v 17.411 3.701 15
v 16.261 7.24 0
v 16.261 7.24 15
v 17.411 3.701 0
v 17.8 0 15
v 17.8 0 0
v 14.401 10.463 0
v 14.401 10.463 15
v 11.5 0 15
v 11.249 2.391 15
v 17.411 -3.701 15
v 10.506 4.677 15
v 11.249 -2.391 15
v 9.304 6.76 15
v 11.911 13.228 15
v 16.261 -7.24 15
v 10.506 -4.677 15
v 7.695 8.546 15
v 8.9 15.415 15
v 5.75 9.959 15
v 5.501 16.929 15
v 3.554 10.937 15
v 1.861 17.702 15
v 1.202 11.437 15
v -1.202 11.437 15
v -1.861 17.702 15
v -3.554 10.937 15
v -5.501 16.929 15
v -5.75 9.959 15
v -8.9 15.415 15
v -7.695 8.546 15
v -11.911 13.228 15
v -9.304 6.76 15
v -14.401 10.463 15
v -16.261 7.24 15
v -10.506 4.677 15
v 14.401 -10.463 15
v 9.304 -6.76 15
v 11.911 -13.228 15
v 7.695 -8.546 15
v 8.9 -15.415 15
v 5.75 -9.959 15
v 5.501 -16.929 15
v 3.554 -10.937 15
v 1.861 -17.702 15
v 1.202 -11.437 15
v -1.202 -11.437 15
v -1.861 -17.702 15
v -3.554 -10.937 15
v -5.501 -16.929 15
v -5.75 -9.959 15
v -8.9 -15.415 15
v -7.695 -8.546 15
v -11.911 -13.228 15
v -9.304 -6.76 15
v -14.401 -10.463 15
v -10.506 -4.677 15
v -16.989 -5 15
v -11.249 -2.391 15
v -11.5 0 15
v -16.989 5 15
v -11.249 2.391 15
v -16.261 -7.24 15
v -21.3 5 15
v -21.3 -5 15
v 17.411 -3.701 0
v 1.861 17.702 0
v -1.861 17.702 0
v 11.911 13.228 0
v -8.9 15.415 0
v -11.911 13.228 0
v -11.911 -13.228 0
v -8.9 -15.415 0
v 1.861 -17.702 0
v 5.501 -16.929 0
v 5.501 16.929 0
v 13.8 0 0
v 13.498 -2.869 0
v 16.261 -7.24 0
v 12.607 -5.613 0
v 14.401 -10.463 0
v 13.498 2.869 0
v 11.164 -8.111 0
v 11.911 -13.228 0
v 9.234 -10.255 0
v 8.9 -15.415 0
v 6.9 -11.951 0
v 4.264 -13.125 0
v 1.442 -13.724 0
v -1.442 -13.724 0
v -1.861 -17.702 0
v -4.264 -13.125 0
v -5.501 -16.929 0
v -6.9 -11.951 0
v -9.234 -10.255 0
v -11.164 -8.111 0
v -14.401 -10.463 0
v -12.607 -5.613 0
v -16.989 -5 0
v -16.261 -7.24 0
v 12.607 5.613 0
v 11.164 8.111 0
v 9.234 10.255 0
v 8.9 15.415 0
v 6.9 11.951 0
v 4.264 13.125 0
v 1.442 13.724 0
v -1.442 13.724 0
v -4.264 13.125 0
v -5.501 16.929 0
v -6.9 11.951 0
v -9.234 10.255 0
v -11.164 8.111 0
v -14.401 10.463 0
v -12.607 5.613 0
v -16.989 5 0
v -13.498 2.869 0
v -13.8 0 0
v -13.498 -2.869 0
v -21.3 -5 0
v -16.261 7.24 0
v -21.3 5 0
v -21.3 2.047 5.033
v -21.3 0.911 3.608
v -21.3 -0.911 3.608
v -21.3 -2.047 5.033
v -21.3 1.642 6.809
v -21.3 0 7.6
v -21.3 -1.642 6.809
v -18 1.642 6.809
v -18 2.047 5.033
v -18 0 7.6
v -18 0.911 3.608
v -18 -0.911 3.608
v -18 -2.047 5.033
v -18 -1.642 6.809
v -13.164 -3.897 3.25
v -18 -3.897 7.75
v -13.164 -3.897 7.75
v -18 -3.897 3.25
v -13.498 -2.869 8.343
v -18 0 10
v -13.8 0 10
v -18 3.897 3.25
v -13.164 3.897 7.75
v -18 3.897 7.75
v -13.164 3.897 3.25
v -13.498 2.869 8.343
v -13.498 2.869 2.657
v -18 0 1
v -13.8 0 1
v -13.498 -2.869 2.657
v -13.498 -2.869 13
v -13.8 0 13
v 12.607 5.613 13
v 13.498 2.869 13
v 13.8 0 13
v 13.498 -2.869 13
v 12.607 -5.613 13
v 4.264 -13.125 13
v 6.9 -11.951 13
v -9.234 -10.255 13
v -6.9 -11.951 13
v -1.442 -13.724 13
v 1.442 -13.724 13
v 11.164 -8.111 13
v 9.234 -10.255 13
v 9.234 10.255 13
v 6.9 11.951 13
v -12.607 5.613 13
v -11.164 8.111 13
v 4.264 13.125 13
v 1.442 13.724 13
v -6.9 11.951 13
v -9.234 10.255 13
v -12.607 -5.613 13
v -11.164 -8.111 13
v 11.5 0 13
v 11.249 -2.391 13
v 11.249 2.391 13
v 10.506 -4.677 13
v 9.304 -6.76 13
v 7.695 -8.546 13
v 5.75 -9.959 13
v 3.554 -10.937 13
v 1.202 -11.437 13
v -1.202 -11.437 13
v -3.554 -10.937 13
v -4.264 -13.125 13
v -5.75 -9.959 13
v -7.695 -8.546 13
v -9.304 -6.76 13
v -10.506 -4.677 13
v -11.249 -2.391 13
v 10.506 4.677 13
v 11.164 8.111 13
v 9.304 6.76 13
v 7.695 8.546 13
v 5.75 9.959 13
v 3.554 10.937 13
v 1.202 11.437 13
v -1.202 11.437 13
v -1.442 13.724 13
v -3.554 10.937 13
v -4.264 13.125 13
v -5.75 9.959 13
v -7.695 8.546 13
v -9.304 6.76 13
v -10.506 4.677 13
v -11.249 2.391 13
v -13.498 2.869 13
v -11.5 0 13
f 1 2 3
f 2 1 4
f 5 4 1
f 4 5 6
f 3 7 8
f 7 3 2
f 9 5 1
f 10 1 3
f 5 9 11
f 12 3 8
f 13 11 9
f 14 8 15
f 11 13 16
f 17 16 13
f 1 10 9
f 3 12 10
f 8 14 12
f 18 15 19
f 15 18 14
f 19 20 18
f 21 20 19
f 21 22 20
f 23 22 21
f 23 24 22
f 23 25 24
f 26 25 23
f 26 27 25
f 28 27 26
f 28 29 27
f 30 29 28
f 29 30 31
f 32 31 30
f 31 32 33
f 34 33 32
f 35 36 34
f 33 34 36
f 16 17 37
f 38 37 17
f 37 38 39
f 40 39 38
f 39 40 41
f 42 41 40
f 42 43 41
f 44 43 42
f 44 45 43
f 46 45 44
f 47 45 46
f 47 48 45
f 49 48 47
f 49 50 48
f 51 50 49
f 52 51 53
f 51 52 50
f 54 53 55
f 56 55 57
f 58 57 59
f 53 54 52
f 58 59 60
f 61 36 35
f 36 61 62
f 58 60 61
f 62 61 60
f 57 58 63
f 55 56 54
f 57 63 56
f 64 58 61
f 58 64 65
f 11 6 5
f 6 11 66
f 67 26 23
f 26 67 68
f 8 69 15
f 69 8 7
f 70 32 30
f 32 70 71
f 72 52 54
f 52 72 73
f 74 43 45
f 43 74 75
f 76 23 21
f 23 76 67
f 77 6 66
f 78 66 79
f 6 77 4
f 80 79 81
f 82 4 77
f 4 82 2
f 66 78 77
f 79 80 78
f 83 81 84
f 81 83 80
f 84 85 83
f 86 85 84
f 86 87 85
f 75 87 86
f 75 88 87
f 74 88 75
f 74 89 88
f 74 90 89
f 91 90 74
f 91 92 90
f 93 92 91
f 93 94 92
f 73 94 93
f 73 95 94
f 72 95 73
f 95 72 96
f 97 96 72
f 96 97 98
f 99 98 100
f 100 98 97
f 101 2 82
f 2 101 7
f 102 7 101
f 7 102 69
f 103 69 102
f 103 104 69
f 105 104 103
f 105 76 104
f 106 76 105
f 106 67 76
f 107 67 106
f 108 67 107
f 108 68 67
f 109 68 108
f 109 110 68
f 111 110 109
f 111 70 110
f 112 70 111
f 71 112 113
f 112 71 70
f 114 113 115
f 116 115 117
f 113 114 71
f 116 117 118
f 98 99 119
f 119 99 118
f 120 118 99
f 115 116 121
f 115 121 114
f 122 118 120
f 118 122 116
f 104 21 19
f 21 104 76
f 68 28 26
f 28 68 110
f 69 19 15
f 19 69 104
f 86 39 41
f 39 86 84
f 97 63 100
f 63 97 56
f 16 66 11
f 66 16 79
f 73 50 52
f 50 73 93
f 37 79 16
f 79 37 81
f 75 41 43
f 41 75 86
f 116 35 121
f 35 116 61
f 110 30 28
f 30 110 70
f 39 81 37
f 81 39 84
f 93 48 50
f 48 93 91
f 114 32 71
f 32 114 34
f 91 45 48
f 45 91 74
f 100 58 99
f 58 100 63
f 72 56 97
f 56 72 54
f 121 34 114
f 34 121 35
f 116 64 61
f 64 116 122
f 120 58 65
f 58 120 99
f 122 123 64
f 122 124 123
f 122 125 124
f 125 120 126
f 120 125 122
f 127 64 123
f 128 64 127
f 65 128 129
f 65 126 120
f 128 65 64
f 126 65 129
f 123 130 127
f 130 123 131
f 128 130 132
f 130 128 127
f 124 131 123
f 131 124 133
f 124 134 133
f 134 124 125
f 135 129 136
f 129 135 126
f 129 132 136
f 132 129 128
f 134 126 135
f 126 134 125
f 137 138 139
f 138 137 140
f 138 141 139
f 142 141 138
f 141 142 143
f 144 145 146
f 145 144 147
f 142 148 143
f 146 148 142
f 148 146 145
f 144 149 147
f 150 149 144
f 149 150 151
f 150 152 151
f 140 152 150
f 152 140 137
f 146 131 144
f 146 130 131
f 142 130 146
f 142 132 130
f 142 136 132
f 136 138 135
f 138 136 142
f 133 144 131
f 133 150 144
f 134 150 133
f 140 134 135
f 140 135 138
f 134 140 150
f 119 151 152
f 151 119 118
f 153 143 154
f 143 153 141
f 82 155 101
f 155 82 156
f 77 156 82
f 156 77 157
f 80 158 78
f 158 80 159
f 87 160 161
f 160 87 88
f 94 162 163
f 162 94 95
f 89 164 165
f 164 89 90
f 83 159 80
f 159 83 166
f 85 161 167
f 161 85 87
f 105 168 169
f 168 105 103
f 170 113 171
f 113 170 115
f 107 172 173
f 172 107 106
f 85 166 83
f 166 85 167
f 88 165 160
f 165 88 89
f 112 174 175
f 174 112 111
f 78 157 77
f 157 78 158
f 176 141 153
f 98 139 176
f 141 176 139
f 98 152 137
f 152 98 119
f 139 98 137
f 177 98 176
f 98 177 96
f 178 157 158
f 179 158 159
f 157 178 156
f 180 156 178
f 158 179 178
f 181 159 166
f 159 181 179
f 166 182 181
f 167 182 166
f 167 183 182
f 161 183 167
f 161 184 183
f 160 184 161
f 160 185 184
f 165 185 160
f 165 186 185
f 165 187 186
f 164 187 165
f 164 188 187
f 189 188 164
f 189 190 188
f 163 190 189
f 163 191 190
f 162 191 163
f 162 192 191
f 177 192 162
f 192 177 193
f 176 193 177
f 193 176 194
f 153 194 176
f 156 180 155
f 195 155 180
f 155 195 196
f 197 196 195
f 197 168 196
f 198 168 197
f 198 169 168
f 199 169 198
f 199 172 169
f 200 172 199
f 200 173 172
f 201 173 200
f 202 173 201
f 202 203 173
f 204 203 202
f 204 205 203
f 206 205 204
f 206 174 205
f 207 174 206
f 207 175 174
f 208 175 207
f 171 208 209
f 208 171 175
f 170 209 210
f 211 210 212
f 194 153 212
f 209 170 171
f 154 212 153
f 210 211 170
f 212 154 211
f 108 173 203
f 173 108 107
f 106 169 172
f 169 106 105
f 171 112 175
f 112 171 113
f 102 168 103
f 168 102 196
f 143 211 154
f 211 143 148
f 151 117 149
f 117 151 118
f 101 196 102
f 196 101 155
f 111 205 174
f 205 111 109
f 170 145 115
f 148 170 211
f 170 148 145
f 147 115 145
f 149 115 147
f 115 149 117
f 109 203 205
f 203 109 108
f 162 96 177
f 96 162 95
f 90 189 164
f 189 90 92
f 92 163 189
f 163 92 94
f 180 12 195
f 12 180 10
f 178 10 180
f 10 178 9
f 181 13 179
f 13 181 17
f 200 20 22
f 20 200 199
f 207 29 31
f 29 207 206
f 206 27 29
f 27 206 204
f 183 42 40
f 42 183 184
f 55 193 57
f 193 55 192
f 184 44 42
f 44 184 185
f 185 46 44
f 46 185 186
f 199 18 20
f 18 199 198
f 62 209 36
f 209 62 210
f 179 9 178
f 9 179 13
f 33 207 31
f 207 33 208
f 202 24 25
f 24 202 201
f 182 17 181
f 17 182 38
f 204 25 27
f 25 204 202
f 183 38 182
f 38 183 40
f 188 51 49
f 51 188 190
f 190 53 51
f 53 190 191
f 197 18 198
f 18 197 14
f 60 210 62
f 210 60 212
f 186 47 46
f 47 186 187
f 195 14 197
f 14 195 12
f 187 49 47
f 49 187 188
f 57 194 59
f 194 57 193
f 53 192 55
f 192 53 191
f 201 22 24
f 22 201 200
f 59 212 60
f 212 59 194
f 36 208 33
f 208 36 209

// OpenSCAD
pipedia = 13.8;
attachoff = 3.5;
screwsize = 2.1;
pvc3_4 = 10.5;
pvc3_4off = pvc3_4 + 1;
nutsize= 9;

endcap();

module endcap(){
  rotate([0,0,0]){
    outerdiameter = (pipedia+4);
    supportradius = pipedia+2;//1.9;
    screwzoff = pipedia+2.5;
    difference(){
      union(){
      cylinder(h = 15, r1 = outerdiameter, r2 = outerdiameter);
        translate([-1.5,-supportradius,0]){
        //cube([17,(2*supportradius),4]);//cube([17,30.8,4]);//, center=true);
        };
        translate([-1.5,-supportradius,16]){
        //cube([17,(2*supportradius),4]);//30.8,4]);//, center=true);
        };
        rotate([0,0,90]){
        translate([0,screwzoff,7.5]){
        cube([10,10,15], center=true);
        };
      };
  };
  rotate([0,0,0]){
     translate([0,0,-2]){
      cylinder(h = 15, r1 = pipedia, r2 = pipedia);
     };
     cylinder(h = 15, r1 = pvc3_4off, r2 = pvc3_4off);
     translate([0,0,5.5]){
     rotate([0,-90,0]){
     cylinder(h=25, r1 =screwsize, r2= screwsize);
     cylinder(h=18, r1 =nutsize/2, r2= nutsize/2, $fn=6);
     };
   };
 };
    };
  };
}
